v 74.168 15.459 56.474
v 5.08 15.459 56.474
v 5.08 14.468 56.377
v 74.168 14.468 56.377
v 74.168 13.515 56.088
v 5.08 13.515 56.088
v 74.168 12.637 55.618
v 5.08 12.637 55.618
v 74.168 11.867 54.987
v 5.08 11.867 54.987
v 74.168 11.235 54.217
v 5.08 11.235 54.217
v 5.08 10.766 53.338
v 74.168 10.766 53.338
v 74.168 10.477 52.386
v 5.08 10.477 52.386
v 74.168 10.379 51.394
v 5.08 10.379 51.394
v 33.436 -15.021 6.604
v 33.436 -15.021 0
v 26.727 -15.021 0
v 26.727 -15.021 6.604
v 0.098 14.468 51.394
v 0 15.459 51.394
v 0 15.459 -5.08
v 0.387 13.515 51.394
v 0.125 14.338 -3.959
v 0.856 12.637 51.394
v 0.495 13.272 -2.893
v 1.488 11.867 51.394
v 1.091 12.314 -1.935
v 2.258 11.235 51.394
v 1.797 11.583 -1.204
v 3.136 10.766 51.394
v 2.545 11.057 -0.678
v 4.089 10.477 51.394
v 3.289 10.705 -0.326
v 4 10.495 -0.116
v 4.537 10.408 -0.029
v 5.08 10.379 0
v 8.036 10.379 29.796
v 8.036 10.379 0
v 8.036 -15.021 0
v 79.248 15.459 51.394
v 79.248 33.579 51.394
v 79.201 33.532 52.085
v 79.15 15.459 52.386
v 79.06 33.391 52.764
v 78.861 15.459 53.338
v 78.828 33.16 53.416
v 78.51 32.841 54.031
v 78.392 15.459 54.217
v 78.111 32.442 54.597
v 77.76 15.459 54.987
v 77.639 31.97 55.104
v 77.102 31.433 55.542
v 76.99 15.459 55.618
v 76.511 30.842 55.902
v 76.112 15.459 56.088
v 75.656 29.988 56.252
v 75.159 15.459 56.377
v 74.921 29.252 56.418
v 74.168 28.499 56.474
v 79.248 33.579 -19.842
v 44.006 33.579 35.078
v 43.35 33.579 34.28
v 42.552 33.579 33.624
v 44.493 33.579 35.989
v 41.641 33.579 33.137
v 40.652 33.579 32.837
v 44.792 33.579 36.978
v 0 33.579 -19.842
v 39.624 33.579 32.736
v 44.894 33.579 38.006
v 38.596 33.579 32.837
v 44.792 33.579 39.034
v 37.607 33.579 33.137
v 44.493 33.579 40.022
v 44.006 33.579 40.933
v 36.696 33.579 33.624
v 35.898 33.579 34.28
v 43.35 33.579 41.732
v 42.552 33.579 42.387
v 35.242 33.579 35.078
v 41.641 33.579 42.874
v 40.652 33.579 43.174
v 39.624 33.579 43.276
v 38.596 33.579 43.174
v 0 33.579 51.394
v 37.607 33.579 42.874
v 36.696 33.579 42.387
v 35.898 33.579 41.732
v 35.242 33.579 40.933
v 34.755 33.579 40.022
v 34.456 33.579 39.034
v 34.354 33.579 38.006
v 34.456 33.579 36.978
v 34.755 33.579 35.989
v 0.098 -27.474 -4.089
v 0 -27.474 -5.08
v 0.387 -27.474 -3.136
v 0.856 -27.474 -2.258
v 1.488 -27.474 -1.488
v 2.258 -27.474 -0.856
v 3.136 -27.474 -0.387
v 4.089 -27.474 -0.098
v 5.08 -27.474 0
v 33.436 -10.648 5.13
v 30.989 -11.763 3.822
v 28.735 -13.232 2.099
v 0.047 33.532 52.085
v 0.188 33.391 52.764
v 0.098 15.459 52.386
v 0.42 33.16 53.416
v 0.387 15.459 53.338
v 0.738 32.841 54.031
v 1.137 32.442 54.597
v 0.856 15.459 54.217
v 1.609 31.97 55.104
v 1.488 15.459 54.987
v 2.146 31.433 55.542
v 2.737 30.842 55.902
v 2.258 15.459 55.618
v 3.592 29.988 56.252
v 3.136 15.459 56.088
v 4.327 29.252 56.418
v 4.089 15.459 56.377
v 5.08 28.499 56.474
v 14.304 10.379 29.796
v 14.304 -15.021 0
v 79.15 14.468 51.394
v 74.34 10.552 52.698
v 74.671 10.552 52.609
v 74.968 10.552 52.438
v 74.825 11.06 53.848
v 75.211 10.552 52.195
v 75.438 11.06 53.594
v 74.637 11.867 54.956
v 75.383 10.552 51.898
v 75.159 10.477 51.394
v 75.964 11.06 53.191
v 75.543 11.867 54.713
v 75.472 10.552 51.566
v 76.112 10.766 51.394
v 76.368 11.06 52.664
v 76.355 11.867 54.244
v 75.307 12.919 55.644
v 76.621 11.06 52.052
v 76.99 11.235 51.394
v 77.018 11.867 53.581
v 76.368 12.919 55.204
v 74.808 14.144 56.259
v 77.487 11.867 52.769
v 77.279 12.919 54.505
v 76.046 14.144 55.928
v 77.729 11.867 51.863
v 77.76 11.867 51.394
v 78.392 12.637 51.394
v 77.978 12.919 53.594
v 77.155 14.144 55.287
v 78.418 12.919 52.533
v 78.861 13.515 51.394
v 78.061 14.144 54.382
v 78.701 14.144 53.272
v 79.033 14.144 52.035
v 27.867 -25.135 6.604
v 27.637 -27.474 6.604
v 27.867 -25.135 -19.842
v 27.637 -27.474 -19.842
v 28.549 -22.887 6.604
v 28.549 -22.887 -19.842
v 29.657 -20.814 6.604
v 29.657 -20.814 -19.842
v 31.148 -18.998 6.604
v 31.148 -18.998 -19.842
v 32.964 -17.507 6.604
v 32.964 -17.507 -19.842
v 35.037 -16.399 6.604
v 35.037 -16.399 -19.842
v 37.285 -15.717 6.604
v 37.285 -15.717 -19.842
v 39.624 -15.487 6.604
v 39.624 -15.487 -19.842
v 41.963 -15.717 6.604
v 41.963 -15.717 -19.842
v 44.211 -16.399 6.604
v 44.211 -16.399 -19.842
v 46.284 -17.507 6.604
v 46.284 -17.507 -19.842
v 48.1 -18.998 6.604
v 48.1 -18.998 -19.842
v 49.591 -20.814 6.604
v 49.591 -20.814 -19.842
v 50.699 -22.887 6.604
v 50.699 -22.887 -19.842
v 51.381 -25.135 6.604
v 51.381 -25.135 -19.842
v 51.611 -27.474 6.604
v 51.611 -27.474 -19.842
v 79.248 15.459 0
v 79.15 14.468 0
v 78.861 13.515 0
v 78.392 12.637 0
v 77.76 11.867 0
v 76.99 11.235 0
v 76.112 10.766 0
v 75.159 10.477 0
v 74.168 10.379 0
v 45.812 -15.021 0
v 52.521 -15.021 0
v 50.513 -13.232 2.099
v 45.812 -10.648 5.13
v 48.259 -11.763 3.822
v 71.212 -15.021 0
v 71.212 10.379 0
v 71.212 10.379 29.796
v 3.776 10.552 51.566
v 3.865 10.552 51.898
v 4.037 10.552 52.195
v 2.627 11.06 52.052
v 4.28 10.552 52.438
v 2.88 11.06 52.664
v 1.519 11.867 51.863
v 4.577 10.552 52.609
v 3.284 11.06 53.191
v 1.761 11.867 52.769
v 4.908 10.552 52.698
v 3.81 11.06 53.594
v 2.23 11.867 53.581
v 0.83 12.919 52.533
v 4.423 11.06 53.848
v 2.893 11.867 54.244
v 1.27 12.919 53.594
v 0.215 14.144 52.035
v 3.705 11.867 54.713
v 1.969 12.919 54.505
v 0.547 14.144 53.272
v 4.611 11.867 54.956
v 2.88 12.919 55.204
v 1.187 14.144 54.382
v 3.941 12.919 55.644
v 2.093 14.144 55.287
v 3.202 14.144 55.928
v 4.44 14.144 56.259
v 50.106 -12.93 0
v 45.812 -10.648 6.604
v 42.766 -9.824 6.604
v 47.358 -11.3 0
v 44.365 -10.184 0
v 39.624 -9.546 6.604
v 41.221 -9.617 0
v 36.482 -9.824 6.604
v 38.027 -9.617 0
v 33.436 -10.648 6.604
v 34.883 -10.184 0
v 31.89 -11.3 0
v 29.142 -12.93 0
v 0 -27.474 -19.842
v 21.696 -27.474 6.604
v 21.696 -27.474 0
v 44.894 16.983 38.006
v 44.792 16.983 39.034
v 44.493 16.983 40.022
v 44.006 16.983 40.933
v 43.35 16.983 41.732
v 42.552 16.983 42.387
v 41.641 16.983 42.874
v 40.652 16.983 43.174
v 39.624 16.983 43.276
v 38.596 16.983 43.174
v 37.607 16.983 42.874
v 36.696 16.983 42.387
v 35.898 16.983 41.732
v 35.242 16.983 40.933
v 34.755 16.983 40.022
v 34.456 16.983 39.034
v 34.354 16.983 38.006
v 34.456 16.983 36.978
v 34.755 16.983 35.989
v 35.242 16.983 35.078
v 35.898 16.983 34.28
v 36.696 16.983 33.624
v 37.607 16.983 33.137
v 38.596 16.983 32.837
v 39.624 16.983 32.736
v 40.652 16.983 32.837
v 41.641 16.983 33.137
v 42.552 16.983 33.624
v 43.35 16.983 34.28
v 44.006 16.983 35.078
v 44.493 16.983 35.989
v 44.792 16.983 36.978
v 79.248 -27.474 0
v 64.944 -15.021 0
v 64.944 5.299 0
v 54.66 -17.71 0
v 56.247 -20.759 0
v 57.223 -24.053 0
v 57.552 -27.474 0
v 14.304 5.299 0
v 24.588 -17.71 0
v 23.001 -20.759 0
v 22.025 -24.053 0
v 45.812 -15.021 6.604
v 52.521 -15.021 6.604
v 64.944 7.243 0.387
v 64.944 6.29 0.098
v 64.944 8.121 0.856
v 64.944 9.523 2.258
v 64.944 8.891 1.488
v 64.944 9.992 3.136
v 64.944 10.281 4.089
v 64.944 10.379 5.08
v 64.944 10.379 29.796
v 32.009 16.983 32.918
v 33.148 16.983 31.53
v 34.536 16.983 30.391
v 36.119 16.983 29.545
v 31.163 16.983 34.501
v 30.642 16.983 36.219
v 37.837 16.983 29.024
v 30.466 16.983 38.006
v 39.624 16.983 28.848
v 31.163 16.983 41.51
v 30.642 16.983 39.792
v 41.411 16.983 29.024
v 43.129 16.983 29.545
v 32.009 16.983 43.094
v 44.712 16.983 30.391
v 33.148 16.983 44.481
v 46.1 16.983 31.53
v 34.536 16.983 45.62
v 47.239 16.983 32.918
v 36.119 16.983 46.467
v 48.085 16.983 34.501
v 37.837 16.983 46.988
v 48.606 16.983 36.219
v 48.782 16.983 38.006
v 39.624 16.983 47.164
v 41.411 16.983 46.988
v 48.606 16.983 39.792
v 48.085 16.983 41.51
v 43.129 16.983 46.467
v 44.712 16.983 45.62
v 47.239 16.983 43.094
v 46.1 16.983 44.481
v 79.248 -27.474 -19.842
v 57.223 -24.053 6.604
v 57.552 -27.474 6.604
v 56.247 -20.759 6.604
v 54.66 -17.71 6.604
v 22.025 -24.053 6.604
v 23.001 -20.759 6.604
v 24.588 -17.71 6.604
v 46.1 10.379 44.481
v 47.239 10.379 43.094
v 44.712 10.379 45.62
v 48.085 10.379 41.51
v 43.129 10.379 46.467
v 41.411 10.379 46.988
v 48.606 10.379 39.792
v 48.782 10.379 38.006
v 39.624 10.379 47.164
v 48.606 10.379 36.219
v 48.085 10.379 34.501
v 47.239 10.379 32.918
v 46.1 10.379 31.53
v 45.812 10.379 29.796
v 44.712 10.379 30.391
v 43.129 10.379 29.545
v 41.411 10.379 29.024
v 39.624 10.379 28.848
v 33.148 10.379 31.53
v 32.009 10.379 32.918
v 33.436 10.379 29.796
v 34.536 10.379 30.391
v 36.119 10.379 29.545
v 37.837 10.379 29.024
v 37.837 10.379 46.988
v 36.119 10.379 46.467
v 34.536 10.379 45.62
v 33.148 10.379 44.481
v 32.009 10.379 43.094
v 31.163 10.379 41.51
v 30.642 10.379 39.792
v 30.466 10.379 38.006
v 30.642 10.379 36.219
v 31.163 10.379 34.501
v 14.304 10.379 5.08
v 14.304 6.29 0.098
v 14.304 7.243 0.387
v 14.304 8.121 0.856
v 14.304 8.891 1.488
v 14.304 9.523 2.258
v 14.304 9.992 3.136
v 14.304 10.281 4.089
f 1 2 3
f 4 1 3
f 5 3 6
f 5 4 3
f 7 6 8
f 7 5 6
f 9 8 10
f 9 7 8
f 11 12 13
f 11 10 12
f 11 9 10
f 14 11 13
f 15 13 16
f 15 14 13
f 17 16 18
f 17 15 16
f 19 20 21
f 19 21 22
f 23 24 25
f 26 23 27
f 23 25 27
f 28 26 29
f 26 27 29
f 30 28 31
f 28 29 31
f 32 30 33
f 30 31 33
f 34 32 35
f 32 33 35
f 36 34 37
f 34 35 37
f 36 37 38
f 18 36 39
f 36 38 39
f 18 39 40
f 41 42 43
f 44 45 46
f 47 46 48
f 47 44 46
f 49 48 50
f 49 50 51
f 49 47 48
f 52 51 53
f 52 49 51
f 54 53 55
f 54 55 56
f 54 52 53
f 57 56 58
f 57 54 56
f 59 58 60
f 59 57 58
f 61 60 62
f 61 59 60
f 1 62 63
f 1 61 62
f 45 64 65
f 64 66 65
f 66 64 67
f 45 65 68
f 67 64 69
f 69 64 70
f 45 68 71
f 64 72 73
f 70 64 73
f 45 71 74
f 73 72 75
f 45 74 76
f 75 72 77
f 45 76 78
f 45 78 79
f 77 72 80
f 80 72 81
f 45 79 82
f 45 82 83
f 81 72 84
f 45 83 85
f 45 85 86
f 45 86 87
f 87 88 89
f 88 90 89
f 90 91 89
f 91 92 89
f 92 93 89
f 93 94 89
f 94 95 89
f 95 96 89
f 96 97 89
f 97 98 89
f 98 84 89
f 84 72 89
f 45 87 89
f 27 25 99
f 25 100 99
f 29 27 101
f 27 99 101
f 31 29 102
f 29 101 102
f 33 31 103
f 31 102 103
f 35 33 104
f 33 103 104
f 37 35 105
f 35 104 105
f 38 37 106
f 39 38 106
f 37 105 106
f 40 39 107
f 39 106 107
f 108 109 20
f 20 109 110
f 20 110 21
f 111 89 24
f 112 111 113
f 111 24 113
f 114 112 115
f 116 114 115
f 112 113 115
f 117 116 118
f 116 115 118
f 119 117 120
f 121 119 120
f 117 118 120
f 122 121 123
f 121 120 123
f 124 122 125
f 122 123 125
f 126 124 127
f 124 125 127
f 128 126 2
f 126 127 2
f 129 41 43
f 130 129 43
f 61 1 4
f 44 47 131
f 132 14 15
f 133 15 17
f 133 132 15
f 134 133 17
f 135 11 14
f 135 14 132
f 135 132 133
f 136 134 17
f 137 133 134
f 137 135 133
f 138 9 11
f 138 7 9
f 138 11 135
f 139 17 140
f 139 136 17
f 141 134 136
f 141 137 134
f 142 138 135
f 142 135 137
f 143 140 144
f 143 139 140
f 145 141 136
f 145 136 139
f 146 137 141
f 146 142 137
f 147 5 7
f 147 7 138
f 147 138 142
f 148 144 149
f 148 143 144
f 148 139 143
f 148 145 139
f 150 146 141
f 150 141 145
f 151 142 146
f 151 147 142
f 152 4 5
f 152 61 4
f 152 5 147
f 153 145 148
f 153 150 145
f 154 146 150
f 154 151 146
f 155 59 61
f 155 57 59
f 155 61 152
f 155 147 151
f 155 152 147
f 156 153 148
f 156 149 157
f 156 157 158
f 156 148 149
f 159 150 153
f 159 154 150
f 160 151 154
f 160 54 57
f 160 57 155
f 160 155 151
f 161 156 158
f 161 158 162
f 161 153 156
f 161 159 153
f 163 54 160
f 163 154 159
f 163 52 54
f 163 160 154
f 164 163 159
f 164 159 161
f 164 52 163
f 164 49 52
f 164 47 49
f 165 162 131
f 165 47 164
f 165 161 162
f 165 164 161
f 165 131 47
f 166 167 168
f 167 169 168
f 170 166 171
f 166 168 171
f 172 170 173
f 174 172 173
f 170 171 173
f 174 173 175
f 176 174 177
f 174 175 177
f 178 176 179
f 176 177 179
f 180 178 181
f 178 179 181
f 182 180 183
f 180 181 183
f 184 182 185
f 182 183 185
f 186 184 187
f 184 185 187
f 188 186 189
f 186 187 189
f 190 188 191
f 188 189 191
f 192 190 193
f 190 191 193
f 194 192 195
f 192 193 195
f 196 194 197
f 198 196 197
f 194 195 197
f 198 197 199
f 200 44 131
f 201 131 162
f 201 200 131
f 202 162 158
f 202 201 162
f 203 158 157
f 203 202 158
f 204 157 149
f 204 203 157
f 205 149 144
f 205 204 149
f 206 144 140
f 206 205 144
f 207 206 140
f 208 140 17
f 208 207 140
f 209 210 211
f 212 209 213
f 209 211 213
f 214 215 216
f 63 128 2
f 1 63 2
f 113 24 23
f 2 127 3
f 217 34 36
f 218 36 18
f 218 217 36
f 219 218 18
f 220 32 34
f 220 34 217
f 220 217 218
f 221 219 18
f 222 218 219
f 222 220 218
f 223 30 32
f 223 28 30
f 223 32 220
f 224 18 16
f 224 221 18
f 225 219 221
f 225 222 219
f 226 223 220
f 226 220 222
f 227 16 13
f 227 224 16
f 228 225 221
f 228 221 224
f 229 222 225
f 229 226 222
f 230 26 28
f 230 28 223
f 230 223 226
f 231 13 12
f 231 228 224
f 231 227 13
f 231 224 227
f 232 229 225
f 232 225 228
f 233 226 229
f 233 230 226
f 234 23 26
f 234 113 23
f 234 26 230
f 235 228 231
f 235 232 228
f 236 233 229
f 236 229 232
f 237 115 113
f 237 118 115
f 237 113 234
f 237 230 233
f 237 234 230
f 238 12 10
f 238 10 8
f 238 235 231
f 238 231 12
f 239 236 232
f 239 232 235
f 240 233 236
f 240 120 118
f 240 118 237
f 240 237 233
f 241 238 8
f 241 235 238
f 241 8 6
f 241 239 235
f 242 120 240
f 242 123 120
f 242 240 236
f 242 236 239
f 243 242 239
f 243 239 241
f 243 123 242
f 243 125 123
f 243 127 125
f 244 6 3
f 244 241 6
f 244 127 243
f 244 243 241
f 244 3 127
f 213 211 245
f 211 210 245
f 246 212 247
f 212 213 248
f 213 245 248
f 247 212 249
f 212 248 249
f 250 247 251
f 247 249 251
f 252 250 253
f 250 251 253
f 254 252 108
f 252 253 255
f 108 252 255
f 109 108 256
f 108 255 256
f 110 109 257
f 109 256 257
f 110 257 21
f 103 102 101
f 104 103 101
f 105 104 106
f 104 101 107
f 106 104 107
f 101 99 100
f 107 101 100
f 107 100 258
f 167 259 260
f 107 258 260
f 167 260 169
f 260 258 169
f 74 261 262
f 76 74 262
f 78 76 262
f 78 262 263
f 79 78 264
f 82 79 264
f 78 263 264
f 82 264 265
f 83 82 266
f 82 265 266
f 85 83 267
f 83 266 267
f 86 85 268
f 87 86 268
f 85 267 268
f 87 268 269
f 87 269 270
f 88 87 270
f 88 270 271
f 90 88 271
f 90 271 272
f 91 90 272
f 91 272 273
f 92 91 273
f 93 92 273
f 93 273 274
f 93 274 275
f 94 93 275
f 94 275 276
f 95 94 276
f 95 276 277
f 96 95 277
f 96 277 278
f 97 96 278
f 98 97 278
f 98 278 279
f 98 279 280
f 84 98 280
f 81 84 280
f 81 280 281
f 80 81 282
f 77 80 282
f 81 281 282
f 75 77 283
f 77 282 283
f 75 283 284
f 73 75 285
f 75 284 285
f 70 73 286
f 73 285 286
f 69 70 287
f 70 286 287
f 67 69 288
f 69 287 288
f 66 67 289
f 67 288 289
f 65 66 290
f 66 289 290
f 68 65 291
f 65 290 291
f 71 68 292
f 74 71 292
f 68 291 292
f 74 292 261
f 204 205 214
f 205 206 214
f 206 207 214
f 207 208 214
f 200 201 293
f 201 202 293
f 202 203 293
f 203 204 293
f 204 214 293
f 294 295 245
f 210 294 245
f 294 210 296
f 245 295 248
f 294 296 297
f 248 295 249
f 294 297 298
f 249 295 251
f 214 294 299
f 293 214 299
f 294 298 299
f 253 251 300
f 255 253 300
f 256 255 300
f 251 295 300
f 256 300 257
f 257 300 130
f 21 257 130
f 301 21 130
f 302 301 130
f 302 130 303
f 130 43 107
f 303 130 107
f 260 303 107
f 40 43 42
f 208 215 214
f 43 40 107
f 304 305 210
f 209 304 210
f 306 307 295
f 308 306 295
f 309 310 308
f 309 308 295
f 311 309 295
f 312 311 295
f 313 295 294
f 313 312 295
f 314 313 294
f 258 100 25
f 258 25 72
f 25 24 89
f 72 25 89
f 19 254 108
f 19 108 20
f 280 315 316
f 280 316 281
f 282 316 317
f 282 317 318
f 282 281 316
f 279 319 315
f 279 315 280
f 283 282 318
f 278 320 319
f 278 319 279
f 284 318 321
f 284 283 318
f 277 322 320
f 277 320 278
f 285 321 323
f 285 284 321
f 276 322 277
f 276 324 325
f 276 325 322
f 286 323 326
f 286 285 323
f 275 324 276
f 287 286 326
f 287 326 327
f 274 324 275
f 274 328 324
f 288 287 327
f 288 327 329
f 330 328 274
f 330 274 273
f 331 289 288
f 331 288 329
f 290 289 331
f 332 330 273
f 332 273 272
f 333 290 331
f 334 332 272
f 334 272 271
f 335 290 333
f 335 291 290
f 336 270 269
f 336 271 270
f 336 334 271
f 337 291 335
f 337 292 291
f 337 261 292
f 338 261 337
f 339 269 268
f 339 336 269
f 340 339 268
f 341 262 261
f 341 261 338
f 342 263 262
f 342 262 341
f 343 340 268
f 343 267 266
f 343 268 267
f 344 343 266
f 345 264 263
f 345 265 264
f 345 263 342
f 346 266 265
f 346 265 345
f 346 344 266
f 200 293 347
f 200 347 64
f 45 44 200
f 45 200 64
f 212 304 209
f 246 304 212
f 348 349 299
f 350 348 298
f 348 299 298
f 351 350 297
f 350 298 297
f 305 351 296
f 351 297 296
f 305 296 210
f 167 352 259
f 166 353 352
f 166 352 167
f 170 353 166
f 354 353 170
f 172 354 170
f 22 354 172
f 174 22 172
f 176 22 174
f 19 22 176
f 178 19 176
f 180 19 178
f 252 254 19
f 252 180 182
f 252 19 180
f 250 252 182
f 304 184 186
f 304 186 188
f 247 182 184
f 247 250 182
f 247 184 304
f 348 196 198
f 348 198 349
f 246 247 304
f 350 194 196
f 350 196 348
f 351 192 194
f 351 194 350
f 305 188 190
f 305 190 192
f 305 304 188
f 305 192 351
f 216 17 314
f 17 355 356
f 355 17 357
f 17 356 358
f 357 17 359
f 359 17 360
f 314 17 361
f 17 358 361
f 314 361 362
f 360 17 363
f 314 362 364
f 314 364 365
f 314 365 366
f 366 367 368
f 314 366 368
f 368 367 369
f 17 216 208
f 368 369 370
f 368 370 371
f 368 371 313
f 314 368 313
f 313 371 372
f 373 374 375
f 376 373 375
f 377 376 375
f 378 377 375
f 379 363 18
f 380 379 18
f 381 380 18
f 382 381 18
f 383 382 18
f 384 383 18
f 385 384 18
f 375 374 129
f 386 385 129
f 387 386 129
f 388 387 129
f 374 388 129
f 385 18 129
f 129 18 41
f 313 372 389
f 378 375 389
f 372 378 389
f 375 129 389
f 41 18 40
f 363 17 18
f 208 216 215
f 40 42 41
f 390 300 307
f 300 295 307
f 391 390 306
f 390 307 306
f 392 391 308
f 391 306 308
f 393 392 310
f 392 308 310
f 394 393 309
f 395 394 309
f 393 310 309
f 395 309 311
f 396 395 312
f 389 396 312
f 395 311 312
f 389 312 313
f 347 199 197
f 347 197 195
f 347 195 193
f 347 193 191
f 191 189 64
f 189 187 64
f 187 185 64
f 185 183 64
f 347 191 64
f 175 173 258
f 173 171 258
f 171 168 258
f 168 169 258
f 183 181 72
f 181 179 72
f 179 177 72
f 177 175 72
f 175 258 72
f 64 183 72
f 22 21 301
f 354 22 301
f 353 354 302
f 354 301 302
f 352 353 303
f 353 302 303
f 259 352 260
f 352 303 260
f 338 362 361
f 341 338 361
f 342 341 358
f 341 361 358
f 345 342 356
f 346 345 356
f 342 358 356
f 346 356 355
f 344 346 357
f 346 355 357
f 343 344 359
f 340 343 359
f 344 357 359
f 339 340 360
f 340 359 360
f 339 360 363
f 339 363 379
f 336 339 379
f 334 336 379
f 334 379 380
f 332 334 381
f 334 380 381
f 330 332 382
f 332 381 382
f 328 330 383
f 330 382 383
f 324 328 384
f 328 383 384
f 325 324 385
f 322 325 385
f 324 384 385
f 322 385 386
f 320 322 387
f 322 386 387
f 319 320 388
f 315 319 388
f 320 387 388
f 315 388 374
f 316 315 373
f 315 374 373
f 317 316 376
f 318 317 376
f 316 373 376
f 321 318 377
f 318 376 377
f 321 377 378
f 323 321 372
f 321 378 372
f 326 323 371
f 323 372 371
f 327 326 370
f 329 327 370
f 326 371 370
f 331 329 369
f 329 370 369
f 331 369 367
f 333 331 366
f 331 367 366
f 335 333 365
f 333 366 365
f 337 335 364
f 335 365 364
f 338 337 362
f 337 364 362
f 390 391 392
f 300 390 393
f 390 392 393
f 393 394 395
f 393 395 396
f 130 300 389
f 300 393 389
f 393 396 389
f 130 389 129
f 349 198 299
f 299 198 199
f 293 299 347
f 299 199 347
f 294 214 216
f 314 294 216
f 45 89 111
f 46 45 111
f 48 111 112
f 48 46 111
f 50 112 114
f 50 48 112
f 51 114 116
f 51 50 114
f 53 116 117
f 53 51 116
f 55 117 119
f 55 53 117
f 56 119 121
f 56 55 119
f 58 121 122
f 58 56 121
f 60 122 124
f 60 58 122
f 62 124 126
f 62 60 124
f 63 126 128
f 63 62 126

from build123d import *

# Parameters (mm, degrees)
F1_DEPTH  = 79.248
F2_W      = 6.267937
F2_H      = 29.795837
F3_DEPTH  = 25.4
F4_DEPTH  = 25.4
F6_DEPTH  = 25.4
F7_DEPTH  = 6.604
F9_DEPTH  = 25.4
F11_DEPTH = 25.4
F2_R      = 5.269734
F12_DEPTH = 25.4
F2_R_2    = 9.158021
F13_DEPTH = 6.604
F14_R     = 5.08


with BuildPart() as f1:
    # F0 (on Right) → F1 (new body)
    with BuildSketch(Plane.YZ):
        Polygon((33.579409, 56.474458), (10.37909, 56.474458), (10.37909, 0), (-27.474059, 0), (-27.474059, -19.842375), (33.579409, -19.842375), align=None)
    extrude(amount=F1_DEPTH)

    # F2 (on face) → F3 (join)
    with BuildSketch(Plane.XZ.offset(-10.37909)):
        with Locations((11.170426, 14.897918)):
            Rectangle(F2_W, F2_H)
    extrude(amount=F3_DEPTH)

    # F2 (on face) → F4 (join)
    with BuildSketch(Plane.XZ.offset(-10.37909)):
        with Locations((68.077574, 14.897918)):
            Rectangle(F2_W, F2_H)
    extrude(amount=F4_DEPTH)

    # F5 (on face) → F6 (cut)
    with BuildSketch(Plane.XY):
        with BuildLine():
            ThreePointArc((51.611442, -27.474059), (39.624, -15.486617), (27.636558, -27.474059))
            Line((27.636558, -27.474059), (51.611442, -27.474059))
        make_face()
    extrude(amount=-F6_DEPTH, mode=Mode.SUBTRACT)

    # F5 (on face) → F7 (join)
    with BuildSketch(Plane.XY):
        with BuildLine():
            Line((21.696024, -27.474059), (27.636558, -27.474059))
            ThreePointArc((27.636558, -27.474059), (39.624, -15.486617), (51.611442, -27.474059))
            Line((51.611442, -27.474059), (57.551976, -27.474059))
            ThreePointArc((57.551976, -27.474059), (39.624, -9.546082), (21.696024, -27.474059))
        make_face()
    extrude(amount=F7_DEPTH)

    # F8 (on face) → F9 (cut)
    with BuildSketch(Plane.YZ.offset(71.211543)):
        Polygon((-15.02091, 0), (10.37909, 29.795837), (-15.02091, 29.795837), align=None)
    extrude(amount=-F9_DEPTH, mode=Mode.SUBTRACT)

    # F10 (on face) → F11 (cut)
    with BuildSketch(Plane(origin=(8.036457, 0, 0), x_dir=(0, -1, 0), z_dir=(-1, 0, 0))):
        Polygon((15.02091, 29.795837), (-10.37909, 29.795837), (15.02091, 0), align=None)
    extrude(amount=-F11_DEPTH, mode=Mode.SUBTRACT)

    # F2 (on face) → F12 (cut)
    with BuildSketch(Plane.XZ.offset(-10.37909)):
        with Locations((39.624, 38.005784)):
            Circle(F2_R)
    extrude(amount=-F12_DEPTH, mode=Mode.SUBTRACT)

    # F2 (on face) → F13 (cut)
    with BuildSketch(Plane.XZ.offset(-10.37909)):
        with Locations((39.624, 38.005784)):
            Circle(F2_R_2)
        with Locations((39.624, 38.005784)):
            Circle(F2_R, mode=Mode.SUBTRACT)
    extrude(amount=-F13_DEPTH, mode=Mode.SUBTRACT)

    # F14
    f14_edges = [f1.edges().sort_by_distance(p)[0] for p in [
        (0, 21.97925, 56.474458),
        (79.248, 21.97925, 56.474458),
        (0, -8.547484, 0),
        (0, 10.37909, 28.237229),
        (39.624, 10.37909, 56.474458),
        (39.624, 33.579409, 56.474458),
        (79.248, 10.37909, 28.237229),
        (39.624, 10.37909, 0),
    ]]
    fillet(f14_edges, radius=F14_R)


solid = f1.part
